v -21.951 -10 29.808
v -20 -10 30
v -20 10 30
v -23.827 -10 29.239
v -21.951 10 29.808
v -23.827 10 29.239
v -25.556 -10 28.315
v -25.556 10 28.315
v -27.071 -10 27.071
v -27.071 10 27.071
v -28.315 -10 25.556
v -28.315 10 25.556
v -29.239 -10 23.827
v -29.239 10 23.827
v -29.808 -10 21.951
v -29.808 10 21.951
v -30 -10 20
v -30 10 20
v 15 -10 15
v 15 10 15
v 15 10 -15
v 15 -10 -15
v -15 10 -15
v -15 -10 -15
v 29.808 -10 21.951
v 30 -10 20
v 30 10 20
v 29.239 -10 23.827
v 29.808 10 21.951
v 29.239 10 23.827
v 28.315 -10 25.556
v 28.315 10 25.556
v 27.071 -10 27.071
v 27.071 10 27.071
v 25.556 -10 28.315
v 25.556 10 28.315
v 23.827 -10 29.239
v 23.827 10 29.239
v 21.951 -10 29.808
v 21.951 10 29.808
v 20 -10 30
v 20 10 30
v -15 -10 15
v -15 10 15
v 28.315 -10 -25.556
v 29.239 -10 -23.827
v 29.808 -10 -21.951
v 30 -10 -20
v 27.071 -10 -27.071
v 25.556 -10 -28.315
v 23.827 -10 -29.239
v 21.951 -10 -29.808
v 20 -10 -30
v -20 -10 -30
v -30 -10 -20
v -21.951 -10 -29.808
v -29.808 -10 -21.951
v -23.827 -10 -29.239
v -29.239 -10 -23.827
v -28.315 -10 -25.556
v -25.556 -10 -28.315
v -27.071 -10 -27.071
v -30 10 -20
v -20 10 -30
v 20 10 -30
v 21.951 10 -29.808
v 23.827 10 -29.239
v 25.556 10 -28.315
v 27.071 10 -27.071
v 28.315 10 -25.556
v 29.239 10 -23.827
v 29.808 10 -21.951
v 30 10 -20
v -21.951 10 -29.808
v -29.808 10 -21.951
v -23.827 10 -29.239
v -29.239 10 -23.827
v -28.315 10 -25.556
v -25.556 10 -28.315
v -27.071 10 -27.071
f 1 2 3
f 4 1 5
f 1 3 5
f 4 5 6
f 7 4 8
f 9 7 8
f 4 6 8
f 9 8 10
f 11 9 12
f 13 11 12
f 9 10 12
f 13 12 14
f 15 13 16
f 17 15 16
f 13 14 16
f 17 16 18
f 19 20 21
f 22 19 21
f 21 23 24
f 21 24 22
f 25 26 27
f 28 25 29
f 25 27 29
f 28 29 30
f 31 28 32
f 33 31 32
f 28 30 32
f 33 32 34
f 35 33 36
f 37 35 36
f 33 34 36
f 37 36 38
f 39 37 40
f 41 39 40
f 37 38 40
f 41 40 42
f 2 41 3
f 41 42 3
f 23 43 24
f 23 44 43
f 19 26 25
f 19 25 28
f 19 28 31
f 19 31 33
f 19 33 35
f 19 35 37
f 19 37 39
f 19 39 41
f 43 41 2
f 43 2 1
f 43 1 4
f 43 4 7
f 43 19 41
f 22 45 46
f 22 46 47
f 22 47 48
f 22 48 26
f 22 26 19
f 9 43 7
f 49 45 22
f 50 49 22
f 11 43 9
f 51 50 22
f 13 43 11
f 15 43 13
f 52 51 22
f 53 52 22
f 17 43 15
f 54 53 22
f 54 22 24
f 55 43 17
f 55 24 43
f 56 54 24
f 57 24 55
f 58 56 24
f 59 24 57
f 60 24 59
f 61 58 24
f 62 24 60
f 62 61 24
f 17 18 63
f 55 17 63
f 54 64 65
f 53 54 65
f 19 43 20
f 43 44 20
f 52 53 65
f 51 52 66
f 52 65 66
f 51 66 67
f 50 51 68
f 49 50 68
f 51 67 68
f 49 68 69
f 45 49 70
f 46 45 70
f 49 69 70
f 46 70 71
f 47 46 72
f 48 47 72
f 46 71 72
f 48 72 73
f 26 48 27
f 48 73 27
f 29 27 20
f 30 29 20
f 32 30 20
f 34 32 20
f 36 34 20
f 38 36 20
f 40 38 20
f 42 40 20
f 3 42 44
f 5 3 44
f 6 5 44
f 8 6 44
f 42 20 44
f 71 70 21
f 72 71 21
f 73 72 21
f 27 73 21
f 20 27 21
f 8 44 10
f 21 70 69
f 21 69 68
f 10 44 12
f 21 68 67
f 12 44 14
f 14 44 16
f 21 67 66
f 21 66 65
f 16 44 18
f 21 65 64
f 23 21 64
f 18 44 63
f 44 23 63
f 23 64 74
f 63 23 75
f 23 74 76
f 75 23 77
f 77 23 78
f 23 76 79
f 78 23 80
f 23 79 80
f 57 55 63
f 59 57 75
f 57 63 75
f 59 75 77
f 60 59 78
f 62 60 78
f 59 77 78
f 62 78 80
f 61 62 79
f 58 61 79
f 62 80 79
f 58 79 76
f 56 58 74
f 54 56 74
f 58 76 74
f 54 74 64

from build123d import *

# Parameters (mm, degrees)
SKETCH1_W           = 30
SKETCH1_H           = 30
BOSS_EXTRUDE1_DEPTH = 10


with BuildPart() as part:
    # Sketch1 → Boss-Extrude1 (new, symmetric)
    with BuildSketch(Plane(origin=(0, 0, 0), x_dir=(1, 0, 0), z_dir=(0, 1, 0))):
        with BuildLine():
            Line((-20, 30), (20, 30))
            ThreePointArc((20, 30), (27.071067812, 27.071067812), (30, 20))
            Line((30, 20), (30, -20))
            ThreePointArc((30, -20), (27.071067812, -27.071067812), (20, -30))
            Line((20, -30), (-20, -30))
            ThreePointArc((-20, -30), (-27.071067812, -27.071067812), (-30, -20))
            Line((-30, -20), (-30, 20))
            ThreePointArc((-30, 20), (-27.071067812, 27.071067812), (-20, 30))
        make_face()
        Rectangle(SKETCH1_W, SKETCH1_H, mode=Mode.SUBTRACT)
    extrude(amount=BOSS_EXTRUDE1_DEPTH, both=True)


solid = part.part
